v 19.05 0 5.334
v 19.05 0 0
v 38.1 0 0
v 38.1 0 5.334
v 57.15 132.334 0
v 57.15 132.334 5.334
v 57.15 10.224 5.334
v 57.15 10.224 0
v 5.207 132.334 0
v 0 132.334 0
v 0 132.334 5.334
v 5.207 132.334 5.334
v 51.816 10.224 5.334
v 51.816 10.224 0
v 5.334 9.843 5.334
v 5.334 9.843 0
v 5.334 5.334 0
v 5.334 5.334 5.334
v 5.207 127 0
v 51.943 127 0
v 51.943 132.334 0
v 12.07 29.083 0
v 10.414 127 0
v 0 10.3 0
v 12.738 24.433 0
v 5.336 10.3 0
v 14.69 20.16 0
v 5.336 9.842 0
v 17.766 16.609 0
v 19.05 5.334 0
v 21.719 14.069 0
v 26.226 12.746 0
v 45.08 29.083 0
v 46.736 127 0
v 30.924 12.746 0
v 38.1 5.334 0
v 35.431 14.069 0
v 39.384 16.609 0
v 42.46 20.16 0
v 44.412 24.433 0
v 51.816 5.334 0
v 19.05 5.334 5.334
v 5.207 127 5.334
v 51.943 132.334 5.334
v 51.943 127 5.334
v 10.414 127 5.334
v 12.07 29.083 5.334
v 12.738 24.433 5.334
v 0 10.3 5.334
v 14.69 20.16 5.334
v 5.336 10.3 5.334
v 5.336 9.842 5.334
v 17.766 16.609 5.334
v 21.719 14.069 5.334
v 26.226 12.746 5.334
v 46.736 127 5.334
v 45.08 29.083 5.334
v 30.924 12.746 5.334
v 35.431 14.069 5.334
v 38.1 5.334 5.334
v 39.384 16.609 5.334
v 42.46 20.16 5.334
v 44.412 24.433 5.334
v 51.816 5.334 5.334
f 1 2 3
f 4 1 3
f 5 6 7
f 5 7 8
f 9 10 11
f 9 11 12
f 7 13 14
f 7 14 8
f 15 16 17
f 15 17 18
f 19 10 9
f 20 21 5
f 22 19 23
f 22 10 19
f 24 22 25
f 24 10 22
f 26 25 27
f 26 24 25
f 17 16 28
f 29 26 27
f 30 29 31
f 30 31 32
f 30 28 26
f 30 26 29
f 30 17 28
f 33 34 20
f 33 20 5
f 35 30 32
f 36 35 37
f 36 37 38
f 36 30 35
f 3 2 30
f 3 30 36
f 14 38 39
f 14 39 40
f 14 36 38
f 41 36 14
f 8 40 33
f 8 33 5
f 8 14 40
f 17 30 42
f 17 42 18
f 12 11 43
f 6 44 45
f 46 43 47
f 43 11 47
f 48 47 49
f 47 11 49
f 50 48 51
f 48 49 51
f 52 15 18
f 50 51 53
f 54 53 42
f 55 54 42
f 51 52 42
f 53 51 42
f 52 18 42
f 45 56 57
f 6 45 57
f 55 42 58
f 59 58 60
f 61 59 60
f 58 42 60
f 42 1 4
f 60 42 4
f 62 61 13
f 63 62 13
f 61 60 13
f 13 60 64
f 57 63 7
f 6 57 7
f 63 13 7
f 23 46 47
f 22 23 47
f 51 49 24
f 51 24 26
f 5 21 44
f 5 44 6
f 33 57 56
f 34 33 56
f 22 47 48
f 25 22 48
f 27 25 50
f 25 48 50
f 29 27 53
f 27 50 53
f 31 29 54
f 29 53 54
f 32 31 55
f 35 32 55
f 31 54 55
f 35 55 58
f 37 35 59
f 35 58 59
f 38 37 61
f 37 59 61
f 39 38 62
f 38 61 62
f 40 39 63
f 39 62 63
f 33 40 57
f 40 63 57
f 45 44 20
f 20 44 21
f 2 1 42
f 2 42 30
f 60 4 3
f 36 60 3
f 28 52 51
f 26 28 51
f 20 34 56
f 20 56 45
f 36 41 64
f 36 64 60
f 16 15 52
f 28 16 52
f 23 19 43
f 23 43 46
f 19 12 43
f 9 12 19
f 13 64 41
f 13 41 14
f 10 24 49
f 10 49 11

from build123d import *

# Parameters (mm, degrees)
SKETCH8_W           = 57.15
SKETCH8_H           = 127
BOSS_EXTRUDE3_DEPTH = 5.334
SKETCH9_R           = 16.505180298
CUT_EXTRUDE4_DEPTH  = 140.368483008
SKETCH12_W          = 19.05
SKETCH12_H          = 5.334
CUT_EXTRUDE8_DEPTH  = 5.334
SKETCH14_W          = 10.414
SKETCH14_H          = 5.334
BOSS_EXTRUDE4_DEPTH = 5.334
SKETCH15_W          = 5.207
SKETCH15_H          = 5.334
CUT_EXTRUDE9_DEPTH  = 5.334
SKETCH16_W          = 5.334
SKETCH16_H          = 4.5085
CUT_EXTRUDE10_DEPTH = 5.334
SKETCH19_W          = 4.7625
SKETCH19_H          = 4.5085
CUT_EXTRUDE12_DEPTH = 5.334
SKETCH20_W          = 5.334
SKETCH20_H          = 4.5085
CUT_EXTRUDE13_DEPTH = 145.225834933
SKETCH21_W          = 5.335765508
SKETCH21_H          = 0.4572
SKETCH21_W_2        = 5.334
SKETCH21_H_2        = 0.381
CUT_EXTRUDE14_DEPTH = 145.245837417


with BuildPart() as part:
    # Sketch8 → Boss-Extrude3 (new body)
    with BuildSketch(Plane.XY):
        with Locations((28.575, 63.5)):
            Rectangle(SKETCH8_W, SKETCH8_H)
    extrude(amount=BOSS_EXTRUDE3_DEPTH)

    # Sketch9 → Cut-Extrude4 (cut, through all)
    with BuildSketch(Plane.XY.offset(5.334)):
        with BuildLine():
            Line((46.736, 127), (10.414, 127))
            Line((10.414, 127), (12.069819702, 29.083))
            ThreePointArc((12.069819702, 29.083), (28.575, 45.588180298), (45.080180298, 29.083))
            Line((45.080180298, 29.083), (46.736, 127))
        make_face()
        with Locations((28.575, 29.083)):
            Circle(SKETCH9_R)
    extrude(amount=-CUT_EXTRUDE4_DEPTH, mode=Mode.SUBTRACT)

    # Sketch12 → Cut-Extrude8 (cut)
    with BuildSketch(Plane(origin=(0, 0, 0), x_dir=(-1, 0, 0), z_dir=(0, -1, 0))):
        with Locations((-47.625, -2.667)):
            Rectangle(SKETCH12_W, SKETCH12_H)
        with Locations((-9.525, -2.667)):
            Rectangle(SKETCH12_W, SKETCH12_H)
    extrude(amount=-CUT_EXTRUDE8_DEPTH, mode=Mode.SUBTRACT)

    # Sketch14 → Boss-Extrude4 (add)
    with BuildSketch(Plane(origin=(0, 127, 0), x_dir=(1, 0, 0), z_dir=(0, 1, 0))):
        with Locations((51.943, -2.667)):
            Rectangle(SKETCH14_W, SKETCH14_H)
        with Locations((5.207, -2.667)):
            Rectangle(SKETCH14_W, SKETCH14_H)
    extrude(amount=BOSS_EXTRUDE4_DEPTH)

    # Sketch15 → Cut-Extrude9 (cut)
    with BuildSketch(Plane(origin=(0, 132.334, 0), x_dir=(1, 0, 0), z_dir=(0, 1, 0))):
        with Locations((7.8105, -2.667)):
            Rectangle(SKETCH15_W, SKETCH15_H)
        with Locations((49.3395, -2.667)):
            Rectangle(SKETCH15_W, SKETCH15_H)
    extrude(amount=-CUT_EXTRUDE9_DEPTH, mode=Mode.SUBTRACT)

    # Sketch16 → Cut-Extrude10 (cut)
    with BuildSketch(Plane.ZY):
        with Locations((2.667, 7.58825)):
            Rectangle(SKETCH16_W, SKETCH16_H)
    extrude(amount=-CUT_EXTRUDE10_DEPTH, mode=Mode.SUBTRACT)

    # Sketch19 → Cut-Extrude12 (cut)
    with BuildSketch(Plane(origin=(57.15, 0, 0), x_dir=(0, 0, -1), z_dir=(1, 0, 0))):
        with Locations((-2.38125, 7.58825)):
            Rectangle(SKETCH19_W, SKETCH19_H)
    extrude(amount=-CUT_EXTRUDE12_DEPTH, mode=Mode.SUBTRACT)

    # Sketch20 → Cut-Extrude13 (cut, through all)
    with BuildSketch(Plane(origin=(0, 0, 4.7625), x_dir=(-1, 0, 0), z_dir=(0, 0, -1))):
        with Locations((-54.483, 7.58825)):
            Rectangle(SKETCH20_W, SKETCH20_H)
    extrude(amount=-CUT_EXTRUDE13_DEPTH, mode=Mode.SUBTRACT)

    # Sketch21 → Cut-Extrude14 (cut, through all)
    with BuildSketch(Plane.XY.offset(5.334)):
        with Locations((2.667882754, 10.0711)):
            Rectangle(SKETCH21_W, SKETCH21_H)
        with Locations((54.483, 10.033)):
            Rectangle(SKETCH21_W_2, SKETCH21_H_2)
    extrude(amount=-CUT_EXTRUDE14_DEPTH, mode=Mode.SUBTRACT)


solid = part.part
